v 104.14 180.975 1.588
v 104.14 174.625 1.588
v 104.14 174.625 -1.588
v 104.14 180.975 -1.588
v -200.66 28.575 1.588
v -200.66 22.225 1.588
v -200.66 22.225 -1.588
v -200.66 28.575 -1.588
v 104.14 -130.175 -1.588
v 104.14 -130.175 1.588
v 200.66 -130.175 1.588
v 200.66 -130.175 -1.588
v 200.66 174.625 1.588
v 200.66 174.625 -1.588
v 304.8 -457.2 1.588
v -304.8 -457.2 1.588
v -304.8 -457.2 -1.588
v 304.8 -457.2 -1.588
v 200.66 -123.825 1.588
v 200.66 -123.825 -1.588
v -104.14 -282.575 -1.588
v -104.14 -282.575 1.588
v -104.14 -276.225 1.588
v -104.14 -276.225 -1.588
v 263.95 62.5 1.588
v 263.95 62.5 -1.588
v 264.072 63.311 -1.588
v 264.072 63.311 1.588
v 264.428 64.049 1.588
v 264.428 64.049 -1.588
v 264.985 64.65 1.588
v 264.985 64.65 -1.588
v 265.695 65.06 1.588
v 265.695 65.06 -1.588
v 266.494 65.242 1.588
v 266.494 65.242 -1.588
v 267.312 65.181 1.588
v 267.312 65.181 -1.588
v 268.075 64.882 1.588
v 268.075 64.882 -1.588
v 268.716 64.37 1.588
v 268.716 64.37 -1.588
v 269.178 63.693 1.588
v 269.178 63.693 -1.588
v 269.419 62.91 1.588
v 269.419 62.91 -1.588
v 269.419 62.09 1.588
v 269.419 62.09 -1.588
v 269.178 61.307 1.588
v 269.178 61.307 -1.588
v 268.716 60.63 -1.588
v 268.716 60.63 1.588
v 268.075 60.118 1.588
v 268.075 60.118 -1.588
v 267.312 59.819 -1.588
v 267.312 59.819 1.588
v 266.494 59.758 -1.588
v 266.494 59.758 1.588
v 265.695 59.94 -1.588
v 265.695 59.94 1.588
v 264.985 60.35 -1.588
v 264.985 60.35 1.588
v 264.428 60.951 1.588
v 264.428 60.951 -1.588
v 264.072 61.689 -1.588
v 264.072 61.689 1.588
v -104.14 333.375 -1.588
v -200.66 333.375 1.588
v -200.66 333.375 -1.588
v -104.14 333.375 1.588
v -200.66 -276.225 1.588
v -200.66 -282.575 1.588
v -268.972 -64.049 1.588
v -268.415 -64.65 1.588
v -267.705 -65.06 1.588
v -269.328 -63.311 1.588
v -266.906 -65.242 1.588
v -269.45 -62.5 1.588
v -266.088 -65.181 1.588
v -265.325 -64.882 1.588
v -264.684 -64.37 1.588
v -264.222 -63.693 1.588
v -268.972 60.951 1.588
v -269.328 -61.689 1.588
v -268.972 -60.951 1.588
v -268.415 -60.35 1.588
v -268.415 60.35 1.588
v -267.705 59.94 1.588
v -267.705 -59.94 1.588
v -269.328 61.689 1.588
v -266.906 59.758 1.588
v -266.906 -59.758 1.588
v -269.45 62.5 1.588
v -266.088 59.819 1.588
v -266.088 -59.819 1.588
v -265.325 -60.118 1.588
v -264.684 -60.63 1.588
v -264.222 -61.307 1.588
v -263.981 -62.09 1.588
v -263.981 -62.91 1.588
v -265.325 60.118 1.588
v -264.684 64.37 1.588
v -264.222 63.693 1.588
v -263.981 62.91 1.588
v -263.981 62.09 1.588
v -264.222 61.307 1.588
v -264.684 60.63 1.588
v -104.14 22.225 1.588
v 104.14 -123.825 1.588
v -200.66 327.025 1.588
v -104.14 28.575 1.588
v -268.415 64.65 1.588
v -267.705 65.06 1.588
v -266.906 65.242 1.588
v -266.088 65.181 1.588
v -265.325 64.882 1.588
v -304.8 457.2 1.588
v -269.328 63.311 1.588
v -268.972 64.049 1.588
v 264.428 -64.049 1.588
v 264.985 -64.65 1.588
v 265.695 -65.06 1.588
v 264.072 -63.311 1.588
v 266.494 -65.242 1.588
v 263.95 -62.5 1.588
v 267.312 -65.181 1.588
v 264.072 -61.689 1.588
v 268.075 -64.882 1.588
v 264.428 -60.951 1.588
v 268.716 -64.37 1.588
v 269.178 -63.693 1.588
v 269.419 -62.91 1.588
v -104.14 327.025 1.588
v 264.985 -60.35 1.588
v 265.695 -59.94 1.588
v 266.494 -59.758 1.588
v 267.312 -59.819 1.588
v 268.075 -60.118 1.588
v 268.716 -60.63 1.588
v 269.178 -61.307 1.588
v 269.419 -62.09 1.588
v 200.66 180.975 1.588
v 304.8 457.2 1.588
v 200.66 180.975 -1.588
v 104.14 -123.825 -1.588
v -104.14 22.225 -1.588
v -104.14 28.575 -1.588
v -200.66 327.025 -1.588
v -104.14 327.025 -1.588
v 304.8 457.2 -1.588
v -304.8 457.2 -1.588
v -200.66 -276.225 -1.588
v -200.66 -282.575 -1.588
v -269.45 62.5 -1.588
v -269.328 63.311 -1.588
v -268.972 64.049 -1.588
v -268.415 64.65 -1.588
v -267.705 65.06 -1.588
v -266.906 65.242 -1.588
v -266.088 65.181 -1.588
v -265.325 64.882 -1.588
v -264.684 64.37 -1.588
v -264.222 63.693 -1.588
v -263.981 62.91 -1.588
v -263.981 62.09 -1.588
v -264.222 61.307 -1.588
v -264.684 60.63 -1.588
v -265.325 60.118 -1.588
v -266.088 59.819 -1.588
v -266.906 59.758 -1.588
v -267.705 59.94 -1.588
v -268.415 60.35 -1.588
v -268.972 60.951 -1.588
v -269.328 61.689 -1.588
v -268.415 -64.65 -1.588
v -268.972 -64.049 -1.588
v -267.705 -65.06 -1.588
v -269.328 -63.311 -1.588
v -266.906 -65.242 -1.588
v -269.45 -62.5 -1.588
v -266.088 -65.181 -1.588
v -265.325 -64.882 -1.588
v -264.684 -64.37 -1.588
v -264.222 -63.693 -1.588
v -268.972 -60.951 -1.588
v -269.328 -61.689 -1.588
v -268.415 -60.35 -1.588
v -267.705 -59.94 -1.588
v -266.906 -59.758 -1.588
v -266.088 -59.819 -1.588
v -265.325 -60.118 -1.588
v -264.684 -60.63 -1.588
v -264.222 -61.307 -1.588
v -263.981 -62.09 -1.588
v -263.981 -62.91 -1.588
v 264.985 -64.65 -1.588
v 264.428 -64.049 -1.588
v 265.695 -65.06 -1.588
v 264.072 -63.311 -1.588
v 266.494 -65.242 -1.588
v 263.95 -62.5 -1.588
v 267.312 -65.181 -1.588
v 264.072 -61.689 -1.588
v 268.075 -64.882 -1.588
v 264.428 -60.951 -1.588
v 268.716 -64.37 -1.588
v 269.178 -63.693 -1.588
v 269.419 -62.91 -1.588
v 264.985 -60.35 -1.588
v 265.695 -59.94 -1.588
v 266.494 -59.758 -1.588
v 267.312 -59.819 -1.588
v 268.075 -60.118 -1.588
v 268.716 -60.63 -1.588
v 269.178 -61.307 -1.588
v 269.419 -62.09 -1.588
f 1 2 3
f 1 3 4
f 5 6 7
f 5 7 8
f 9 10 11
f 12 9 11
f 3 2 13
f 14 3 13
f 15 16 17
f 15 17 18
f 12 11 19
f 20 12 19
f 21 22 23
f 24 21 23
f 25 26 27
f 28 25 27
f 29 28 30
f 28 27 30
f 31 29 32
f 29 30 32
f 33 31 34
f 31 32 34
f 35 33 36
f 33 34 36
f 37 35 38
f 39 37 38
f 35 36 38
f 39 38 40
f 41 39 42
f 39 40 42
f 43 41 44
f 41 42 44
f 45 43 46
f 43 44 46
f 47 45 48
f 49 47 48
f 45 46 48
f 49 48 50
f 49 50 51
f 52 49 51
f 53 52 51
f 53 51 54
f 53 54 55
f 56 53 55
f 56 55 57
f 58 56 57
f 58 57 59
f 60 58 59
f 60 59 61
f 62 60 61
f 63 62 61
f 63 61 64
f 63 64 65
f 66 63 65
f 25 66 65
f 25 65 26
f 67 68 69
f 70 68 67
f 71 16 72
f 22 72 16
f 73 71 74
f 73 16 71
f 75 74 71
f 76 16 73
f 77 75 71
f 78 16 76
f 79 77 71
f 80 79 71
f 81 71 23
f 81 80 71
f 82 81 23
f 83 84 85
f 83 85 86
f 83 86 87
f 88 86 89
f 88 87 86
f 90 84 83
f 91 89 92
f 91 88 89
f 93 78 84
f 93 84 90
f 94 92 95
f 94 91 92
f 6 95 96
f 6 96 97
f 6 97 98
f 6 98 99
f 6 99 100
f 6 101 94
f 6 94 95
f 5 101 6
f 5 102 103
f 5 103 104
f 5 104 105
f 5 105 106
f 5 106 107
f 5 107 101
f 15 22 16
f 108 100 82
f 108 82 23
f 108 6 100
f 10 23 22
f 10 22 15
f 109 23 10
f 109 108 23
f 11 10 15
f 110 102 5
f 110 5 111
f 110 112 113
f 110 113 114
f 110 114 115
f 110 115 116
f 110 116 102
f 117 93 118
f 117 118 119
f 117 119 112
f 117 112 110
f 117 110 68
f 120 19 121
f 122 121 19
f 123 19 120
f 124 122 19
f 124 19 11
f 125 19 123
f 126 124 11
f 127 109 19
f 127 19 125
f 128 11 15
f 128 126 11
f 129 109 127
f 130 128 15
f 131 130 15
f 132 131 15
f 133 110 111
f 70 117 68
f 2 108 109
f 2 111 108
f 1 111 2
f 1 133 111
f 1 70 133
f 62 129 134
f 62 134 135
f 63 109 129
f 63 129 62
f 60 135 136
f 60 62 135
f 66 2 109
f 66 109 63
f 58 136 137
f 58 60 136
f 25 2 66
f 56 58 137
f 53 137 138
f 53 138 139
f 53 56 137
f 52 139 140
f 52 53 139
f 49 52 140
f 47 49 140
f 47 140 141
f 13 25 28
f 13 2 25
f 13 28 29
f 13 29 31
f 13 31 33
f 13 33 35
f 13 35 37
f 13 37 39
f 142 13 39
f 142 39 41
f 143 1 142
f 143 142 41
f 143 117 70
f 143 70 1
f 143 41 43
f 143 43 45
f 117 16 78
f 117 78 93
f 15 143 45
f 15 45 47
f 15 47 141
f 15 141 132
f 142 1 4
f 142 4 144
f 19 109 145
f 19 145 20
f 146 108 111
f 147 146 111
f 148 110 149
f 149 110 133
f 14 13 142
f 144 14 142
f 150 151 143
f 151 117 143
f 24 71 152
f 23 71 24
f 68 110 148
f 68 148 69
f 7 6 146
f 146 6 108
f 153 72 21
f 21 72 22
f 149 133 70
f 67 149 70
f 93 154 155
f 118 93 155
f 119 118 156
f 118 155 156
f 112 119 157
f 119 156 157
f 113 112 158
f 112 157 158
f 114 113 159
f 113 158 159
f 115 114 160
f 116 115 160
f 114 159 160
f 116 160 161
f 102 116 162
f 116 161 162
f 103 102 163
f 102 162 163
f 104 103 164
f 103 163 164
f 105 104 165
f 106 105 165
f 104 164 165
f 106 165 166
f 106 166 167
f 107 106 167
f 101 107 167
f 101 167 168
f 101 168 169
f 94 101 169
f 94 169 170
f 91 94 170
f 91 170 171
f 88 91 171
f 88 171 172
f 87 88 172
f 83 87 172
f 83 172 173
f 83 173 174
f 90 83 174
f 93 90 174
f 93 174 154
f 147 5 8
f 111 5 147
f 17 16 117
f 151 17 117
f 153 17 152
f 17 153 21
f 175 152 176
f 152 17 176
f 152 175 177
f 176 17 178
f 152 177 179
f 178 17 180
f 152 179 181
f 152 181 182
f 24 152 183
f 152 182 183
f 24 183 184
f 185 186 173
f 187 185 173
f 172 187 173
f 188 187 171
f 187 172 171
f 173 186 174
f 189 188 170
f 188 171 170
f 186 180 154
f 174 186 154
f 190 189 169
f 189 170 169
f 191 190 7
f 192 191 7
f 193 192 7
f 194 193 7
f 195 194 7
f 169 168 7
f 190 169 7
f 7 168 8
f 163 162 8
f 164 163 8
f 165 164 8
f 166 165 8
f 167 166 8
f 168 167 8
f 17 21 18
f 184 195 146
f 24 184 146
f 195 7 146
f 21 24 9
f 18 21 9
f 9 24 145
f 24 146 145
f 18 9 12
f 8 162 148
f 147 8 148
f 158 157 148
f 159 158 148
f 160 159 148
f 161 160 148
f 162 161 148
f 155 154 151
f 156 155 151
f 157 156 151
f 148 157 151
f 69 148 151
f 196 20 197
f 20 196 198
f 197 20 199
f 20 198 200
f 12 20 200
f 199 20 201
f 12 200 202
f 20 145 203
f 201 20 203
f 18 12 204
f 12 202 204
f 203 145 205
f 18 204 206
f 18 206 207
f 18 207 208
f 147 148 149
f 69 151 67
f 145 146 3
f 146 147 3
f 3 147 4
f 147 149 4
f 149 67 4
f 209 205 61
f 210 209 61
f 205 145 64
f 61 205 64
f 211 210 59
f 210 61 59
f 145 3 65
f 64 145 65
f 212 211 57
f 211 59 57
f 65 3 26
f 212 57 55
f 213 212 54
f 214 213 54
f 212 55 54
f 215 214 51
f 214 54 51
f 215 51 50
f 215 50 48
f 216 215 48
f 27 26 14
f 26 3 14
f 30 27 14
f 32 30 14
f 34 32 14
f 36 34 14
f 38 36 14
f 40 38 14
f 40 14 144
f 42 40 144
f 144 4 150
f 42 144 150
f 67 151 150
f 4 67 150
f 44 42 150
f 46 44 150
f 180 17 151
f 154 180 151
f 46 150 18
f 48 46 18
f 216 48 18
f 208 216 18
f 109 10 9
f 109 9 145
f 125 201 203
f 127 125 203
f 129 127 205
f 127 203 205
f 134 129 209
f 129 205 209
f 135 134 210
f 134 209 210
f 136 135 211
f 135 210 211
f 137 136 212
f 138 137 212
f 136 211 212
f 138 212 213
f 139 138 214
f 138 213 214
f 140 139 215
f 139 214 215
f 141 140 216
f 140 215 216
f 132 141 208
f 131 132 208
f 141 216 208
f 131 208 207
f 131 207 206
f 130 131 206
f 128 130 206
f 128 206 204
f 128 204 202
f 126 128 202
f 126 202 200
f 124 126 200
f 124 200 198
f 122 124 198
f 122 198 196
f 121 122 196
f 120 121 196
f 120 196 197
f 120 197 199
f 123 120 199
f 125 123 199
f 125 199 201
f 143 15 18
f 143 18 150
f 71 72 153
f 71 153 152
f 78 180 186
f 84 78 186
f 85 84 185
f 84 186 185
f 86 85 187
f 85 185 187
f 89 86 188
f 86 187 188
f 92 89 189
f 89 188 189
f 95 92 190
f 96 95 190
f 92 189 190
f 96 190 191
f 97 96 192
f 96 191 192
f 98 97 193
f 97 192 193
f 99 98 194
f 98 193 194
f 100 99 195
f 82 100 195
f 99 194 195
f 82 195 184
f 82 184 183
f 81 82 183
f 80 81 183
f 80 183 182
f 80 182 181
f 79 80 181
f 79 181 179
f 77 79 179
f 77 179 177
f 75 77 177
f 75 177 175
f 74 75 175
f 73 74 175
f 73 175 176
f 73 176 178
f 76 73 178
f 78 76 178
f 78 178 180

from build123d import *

# Parameters (mm, degrees)
SKETCH1_W            = 609.6
SKETCH1_H            = 914.4
BOSS_EXTRUDE1_DEPTH  = 1.5875
SKETCH2_W            = 96.52
SKETCH2_H            = 6.35
CUT_EXTRUDE1_DEPTH   = 550.495187081
M5_CLEARANCE_HOLE1_D = 5.5


with BuildPart() as part:
    # Sketch1 → Boss-Extrude1 (new, symmetric)
    with BuildSketch(Plane.XY):
        Rectangle(SKETCH1_W, SKETCH1_H)
    extrude(amount=BOSS_EXTRUDE1_DEPTH, both=True)

    # Sketch2 → Cut-Extrude1 (cut, through all)
    with BuildSketch(Plane.XY.offset(1.5875)):
        with Locations((152.4, 177.8)):
            Rectangle(SKETCH2_W, SKETCH2_H)
        with Locations((-152.4, 25.4)):
            Rectangle(SKETCH2_W, SKETCH2_H)
        with Locations((152.4, -127)):
            Rectangle(SKETCH2_W, SKETCH2_H)
        with Locations((-152.4, -279.4)):
            Rectangle(SKETCH2_W, SKETCH2_H)
        with Locations((-152.4, 330.2)):
            Rectangle(SKETCH2_W, SKETCH2_H)
    extrude(amount=-CUT_EXTRUDE1_DEPTH, mode=Mode.SUBTRACT)

    # M5 Clearance Hole1 (through all)
    with Locations(Plane.XY.offset(1.5875)):
        with Locations((-266.7, 62.5), (-266.7, -62.5), (266.7, 62.5), (266.7, -62.5)):
            Hole(M5_CLEARANCE_HOLE1_D / 2)


solid = part.part
